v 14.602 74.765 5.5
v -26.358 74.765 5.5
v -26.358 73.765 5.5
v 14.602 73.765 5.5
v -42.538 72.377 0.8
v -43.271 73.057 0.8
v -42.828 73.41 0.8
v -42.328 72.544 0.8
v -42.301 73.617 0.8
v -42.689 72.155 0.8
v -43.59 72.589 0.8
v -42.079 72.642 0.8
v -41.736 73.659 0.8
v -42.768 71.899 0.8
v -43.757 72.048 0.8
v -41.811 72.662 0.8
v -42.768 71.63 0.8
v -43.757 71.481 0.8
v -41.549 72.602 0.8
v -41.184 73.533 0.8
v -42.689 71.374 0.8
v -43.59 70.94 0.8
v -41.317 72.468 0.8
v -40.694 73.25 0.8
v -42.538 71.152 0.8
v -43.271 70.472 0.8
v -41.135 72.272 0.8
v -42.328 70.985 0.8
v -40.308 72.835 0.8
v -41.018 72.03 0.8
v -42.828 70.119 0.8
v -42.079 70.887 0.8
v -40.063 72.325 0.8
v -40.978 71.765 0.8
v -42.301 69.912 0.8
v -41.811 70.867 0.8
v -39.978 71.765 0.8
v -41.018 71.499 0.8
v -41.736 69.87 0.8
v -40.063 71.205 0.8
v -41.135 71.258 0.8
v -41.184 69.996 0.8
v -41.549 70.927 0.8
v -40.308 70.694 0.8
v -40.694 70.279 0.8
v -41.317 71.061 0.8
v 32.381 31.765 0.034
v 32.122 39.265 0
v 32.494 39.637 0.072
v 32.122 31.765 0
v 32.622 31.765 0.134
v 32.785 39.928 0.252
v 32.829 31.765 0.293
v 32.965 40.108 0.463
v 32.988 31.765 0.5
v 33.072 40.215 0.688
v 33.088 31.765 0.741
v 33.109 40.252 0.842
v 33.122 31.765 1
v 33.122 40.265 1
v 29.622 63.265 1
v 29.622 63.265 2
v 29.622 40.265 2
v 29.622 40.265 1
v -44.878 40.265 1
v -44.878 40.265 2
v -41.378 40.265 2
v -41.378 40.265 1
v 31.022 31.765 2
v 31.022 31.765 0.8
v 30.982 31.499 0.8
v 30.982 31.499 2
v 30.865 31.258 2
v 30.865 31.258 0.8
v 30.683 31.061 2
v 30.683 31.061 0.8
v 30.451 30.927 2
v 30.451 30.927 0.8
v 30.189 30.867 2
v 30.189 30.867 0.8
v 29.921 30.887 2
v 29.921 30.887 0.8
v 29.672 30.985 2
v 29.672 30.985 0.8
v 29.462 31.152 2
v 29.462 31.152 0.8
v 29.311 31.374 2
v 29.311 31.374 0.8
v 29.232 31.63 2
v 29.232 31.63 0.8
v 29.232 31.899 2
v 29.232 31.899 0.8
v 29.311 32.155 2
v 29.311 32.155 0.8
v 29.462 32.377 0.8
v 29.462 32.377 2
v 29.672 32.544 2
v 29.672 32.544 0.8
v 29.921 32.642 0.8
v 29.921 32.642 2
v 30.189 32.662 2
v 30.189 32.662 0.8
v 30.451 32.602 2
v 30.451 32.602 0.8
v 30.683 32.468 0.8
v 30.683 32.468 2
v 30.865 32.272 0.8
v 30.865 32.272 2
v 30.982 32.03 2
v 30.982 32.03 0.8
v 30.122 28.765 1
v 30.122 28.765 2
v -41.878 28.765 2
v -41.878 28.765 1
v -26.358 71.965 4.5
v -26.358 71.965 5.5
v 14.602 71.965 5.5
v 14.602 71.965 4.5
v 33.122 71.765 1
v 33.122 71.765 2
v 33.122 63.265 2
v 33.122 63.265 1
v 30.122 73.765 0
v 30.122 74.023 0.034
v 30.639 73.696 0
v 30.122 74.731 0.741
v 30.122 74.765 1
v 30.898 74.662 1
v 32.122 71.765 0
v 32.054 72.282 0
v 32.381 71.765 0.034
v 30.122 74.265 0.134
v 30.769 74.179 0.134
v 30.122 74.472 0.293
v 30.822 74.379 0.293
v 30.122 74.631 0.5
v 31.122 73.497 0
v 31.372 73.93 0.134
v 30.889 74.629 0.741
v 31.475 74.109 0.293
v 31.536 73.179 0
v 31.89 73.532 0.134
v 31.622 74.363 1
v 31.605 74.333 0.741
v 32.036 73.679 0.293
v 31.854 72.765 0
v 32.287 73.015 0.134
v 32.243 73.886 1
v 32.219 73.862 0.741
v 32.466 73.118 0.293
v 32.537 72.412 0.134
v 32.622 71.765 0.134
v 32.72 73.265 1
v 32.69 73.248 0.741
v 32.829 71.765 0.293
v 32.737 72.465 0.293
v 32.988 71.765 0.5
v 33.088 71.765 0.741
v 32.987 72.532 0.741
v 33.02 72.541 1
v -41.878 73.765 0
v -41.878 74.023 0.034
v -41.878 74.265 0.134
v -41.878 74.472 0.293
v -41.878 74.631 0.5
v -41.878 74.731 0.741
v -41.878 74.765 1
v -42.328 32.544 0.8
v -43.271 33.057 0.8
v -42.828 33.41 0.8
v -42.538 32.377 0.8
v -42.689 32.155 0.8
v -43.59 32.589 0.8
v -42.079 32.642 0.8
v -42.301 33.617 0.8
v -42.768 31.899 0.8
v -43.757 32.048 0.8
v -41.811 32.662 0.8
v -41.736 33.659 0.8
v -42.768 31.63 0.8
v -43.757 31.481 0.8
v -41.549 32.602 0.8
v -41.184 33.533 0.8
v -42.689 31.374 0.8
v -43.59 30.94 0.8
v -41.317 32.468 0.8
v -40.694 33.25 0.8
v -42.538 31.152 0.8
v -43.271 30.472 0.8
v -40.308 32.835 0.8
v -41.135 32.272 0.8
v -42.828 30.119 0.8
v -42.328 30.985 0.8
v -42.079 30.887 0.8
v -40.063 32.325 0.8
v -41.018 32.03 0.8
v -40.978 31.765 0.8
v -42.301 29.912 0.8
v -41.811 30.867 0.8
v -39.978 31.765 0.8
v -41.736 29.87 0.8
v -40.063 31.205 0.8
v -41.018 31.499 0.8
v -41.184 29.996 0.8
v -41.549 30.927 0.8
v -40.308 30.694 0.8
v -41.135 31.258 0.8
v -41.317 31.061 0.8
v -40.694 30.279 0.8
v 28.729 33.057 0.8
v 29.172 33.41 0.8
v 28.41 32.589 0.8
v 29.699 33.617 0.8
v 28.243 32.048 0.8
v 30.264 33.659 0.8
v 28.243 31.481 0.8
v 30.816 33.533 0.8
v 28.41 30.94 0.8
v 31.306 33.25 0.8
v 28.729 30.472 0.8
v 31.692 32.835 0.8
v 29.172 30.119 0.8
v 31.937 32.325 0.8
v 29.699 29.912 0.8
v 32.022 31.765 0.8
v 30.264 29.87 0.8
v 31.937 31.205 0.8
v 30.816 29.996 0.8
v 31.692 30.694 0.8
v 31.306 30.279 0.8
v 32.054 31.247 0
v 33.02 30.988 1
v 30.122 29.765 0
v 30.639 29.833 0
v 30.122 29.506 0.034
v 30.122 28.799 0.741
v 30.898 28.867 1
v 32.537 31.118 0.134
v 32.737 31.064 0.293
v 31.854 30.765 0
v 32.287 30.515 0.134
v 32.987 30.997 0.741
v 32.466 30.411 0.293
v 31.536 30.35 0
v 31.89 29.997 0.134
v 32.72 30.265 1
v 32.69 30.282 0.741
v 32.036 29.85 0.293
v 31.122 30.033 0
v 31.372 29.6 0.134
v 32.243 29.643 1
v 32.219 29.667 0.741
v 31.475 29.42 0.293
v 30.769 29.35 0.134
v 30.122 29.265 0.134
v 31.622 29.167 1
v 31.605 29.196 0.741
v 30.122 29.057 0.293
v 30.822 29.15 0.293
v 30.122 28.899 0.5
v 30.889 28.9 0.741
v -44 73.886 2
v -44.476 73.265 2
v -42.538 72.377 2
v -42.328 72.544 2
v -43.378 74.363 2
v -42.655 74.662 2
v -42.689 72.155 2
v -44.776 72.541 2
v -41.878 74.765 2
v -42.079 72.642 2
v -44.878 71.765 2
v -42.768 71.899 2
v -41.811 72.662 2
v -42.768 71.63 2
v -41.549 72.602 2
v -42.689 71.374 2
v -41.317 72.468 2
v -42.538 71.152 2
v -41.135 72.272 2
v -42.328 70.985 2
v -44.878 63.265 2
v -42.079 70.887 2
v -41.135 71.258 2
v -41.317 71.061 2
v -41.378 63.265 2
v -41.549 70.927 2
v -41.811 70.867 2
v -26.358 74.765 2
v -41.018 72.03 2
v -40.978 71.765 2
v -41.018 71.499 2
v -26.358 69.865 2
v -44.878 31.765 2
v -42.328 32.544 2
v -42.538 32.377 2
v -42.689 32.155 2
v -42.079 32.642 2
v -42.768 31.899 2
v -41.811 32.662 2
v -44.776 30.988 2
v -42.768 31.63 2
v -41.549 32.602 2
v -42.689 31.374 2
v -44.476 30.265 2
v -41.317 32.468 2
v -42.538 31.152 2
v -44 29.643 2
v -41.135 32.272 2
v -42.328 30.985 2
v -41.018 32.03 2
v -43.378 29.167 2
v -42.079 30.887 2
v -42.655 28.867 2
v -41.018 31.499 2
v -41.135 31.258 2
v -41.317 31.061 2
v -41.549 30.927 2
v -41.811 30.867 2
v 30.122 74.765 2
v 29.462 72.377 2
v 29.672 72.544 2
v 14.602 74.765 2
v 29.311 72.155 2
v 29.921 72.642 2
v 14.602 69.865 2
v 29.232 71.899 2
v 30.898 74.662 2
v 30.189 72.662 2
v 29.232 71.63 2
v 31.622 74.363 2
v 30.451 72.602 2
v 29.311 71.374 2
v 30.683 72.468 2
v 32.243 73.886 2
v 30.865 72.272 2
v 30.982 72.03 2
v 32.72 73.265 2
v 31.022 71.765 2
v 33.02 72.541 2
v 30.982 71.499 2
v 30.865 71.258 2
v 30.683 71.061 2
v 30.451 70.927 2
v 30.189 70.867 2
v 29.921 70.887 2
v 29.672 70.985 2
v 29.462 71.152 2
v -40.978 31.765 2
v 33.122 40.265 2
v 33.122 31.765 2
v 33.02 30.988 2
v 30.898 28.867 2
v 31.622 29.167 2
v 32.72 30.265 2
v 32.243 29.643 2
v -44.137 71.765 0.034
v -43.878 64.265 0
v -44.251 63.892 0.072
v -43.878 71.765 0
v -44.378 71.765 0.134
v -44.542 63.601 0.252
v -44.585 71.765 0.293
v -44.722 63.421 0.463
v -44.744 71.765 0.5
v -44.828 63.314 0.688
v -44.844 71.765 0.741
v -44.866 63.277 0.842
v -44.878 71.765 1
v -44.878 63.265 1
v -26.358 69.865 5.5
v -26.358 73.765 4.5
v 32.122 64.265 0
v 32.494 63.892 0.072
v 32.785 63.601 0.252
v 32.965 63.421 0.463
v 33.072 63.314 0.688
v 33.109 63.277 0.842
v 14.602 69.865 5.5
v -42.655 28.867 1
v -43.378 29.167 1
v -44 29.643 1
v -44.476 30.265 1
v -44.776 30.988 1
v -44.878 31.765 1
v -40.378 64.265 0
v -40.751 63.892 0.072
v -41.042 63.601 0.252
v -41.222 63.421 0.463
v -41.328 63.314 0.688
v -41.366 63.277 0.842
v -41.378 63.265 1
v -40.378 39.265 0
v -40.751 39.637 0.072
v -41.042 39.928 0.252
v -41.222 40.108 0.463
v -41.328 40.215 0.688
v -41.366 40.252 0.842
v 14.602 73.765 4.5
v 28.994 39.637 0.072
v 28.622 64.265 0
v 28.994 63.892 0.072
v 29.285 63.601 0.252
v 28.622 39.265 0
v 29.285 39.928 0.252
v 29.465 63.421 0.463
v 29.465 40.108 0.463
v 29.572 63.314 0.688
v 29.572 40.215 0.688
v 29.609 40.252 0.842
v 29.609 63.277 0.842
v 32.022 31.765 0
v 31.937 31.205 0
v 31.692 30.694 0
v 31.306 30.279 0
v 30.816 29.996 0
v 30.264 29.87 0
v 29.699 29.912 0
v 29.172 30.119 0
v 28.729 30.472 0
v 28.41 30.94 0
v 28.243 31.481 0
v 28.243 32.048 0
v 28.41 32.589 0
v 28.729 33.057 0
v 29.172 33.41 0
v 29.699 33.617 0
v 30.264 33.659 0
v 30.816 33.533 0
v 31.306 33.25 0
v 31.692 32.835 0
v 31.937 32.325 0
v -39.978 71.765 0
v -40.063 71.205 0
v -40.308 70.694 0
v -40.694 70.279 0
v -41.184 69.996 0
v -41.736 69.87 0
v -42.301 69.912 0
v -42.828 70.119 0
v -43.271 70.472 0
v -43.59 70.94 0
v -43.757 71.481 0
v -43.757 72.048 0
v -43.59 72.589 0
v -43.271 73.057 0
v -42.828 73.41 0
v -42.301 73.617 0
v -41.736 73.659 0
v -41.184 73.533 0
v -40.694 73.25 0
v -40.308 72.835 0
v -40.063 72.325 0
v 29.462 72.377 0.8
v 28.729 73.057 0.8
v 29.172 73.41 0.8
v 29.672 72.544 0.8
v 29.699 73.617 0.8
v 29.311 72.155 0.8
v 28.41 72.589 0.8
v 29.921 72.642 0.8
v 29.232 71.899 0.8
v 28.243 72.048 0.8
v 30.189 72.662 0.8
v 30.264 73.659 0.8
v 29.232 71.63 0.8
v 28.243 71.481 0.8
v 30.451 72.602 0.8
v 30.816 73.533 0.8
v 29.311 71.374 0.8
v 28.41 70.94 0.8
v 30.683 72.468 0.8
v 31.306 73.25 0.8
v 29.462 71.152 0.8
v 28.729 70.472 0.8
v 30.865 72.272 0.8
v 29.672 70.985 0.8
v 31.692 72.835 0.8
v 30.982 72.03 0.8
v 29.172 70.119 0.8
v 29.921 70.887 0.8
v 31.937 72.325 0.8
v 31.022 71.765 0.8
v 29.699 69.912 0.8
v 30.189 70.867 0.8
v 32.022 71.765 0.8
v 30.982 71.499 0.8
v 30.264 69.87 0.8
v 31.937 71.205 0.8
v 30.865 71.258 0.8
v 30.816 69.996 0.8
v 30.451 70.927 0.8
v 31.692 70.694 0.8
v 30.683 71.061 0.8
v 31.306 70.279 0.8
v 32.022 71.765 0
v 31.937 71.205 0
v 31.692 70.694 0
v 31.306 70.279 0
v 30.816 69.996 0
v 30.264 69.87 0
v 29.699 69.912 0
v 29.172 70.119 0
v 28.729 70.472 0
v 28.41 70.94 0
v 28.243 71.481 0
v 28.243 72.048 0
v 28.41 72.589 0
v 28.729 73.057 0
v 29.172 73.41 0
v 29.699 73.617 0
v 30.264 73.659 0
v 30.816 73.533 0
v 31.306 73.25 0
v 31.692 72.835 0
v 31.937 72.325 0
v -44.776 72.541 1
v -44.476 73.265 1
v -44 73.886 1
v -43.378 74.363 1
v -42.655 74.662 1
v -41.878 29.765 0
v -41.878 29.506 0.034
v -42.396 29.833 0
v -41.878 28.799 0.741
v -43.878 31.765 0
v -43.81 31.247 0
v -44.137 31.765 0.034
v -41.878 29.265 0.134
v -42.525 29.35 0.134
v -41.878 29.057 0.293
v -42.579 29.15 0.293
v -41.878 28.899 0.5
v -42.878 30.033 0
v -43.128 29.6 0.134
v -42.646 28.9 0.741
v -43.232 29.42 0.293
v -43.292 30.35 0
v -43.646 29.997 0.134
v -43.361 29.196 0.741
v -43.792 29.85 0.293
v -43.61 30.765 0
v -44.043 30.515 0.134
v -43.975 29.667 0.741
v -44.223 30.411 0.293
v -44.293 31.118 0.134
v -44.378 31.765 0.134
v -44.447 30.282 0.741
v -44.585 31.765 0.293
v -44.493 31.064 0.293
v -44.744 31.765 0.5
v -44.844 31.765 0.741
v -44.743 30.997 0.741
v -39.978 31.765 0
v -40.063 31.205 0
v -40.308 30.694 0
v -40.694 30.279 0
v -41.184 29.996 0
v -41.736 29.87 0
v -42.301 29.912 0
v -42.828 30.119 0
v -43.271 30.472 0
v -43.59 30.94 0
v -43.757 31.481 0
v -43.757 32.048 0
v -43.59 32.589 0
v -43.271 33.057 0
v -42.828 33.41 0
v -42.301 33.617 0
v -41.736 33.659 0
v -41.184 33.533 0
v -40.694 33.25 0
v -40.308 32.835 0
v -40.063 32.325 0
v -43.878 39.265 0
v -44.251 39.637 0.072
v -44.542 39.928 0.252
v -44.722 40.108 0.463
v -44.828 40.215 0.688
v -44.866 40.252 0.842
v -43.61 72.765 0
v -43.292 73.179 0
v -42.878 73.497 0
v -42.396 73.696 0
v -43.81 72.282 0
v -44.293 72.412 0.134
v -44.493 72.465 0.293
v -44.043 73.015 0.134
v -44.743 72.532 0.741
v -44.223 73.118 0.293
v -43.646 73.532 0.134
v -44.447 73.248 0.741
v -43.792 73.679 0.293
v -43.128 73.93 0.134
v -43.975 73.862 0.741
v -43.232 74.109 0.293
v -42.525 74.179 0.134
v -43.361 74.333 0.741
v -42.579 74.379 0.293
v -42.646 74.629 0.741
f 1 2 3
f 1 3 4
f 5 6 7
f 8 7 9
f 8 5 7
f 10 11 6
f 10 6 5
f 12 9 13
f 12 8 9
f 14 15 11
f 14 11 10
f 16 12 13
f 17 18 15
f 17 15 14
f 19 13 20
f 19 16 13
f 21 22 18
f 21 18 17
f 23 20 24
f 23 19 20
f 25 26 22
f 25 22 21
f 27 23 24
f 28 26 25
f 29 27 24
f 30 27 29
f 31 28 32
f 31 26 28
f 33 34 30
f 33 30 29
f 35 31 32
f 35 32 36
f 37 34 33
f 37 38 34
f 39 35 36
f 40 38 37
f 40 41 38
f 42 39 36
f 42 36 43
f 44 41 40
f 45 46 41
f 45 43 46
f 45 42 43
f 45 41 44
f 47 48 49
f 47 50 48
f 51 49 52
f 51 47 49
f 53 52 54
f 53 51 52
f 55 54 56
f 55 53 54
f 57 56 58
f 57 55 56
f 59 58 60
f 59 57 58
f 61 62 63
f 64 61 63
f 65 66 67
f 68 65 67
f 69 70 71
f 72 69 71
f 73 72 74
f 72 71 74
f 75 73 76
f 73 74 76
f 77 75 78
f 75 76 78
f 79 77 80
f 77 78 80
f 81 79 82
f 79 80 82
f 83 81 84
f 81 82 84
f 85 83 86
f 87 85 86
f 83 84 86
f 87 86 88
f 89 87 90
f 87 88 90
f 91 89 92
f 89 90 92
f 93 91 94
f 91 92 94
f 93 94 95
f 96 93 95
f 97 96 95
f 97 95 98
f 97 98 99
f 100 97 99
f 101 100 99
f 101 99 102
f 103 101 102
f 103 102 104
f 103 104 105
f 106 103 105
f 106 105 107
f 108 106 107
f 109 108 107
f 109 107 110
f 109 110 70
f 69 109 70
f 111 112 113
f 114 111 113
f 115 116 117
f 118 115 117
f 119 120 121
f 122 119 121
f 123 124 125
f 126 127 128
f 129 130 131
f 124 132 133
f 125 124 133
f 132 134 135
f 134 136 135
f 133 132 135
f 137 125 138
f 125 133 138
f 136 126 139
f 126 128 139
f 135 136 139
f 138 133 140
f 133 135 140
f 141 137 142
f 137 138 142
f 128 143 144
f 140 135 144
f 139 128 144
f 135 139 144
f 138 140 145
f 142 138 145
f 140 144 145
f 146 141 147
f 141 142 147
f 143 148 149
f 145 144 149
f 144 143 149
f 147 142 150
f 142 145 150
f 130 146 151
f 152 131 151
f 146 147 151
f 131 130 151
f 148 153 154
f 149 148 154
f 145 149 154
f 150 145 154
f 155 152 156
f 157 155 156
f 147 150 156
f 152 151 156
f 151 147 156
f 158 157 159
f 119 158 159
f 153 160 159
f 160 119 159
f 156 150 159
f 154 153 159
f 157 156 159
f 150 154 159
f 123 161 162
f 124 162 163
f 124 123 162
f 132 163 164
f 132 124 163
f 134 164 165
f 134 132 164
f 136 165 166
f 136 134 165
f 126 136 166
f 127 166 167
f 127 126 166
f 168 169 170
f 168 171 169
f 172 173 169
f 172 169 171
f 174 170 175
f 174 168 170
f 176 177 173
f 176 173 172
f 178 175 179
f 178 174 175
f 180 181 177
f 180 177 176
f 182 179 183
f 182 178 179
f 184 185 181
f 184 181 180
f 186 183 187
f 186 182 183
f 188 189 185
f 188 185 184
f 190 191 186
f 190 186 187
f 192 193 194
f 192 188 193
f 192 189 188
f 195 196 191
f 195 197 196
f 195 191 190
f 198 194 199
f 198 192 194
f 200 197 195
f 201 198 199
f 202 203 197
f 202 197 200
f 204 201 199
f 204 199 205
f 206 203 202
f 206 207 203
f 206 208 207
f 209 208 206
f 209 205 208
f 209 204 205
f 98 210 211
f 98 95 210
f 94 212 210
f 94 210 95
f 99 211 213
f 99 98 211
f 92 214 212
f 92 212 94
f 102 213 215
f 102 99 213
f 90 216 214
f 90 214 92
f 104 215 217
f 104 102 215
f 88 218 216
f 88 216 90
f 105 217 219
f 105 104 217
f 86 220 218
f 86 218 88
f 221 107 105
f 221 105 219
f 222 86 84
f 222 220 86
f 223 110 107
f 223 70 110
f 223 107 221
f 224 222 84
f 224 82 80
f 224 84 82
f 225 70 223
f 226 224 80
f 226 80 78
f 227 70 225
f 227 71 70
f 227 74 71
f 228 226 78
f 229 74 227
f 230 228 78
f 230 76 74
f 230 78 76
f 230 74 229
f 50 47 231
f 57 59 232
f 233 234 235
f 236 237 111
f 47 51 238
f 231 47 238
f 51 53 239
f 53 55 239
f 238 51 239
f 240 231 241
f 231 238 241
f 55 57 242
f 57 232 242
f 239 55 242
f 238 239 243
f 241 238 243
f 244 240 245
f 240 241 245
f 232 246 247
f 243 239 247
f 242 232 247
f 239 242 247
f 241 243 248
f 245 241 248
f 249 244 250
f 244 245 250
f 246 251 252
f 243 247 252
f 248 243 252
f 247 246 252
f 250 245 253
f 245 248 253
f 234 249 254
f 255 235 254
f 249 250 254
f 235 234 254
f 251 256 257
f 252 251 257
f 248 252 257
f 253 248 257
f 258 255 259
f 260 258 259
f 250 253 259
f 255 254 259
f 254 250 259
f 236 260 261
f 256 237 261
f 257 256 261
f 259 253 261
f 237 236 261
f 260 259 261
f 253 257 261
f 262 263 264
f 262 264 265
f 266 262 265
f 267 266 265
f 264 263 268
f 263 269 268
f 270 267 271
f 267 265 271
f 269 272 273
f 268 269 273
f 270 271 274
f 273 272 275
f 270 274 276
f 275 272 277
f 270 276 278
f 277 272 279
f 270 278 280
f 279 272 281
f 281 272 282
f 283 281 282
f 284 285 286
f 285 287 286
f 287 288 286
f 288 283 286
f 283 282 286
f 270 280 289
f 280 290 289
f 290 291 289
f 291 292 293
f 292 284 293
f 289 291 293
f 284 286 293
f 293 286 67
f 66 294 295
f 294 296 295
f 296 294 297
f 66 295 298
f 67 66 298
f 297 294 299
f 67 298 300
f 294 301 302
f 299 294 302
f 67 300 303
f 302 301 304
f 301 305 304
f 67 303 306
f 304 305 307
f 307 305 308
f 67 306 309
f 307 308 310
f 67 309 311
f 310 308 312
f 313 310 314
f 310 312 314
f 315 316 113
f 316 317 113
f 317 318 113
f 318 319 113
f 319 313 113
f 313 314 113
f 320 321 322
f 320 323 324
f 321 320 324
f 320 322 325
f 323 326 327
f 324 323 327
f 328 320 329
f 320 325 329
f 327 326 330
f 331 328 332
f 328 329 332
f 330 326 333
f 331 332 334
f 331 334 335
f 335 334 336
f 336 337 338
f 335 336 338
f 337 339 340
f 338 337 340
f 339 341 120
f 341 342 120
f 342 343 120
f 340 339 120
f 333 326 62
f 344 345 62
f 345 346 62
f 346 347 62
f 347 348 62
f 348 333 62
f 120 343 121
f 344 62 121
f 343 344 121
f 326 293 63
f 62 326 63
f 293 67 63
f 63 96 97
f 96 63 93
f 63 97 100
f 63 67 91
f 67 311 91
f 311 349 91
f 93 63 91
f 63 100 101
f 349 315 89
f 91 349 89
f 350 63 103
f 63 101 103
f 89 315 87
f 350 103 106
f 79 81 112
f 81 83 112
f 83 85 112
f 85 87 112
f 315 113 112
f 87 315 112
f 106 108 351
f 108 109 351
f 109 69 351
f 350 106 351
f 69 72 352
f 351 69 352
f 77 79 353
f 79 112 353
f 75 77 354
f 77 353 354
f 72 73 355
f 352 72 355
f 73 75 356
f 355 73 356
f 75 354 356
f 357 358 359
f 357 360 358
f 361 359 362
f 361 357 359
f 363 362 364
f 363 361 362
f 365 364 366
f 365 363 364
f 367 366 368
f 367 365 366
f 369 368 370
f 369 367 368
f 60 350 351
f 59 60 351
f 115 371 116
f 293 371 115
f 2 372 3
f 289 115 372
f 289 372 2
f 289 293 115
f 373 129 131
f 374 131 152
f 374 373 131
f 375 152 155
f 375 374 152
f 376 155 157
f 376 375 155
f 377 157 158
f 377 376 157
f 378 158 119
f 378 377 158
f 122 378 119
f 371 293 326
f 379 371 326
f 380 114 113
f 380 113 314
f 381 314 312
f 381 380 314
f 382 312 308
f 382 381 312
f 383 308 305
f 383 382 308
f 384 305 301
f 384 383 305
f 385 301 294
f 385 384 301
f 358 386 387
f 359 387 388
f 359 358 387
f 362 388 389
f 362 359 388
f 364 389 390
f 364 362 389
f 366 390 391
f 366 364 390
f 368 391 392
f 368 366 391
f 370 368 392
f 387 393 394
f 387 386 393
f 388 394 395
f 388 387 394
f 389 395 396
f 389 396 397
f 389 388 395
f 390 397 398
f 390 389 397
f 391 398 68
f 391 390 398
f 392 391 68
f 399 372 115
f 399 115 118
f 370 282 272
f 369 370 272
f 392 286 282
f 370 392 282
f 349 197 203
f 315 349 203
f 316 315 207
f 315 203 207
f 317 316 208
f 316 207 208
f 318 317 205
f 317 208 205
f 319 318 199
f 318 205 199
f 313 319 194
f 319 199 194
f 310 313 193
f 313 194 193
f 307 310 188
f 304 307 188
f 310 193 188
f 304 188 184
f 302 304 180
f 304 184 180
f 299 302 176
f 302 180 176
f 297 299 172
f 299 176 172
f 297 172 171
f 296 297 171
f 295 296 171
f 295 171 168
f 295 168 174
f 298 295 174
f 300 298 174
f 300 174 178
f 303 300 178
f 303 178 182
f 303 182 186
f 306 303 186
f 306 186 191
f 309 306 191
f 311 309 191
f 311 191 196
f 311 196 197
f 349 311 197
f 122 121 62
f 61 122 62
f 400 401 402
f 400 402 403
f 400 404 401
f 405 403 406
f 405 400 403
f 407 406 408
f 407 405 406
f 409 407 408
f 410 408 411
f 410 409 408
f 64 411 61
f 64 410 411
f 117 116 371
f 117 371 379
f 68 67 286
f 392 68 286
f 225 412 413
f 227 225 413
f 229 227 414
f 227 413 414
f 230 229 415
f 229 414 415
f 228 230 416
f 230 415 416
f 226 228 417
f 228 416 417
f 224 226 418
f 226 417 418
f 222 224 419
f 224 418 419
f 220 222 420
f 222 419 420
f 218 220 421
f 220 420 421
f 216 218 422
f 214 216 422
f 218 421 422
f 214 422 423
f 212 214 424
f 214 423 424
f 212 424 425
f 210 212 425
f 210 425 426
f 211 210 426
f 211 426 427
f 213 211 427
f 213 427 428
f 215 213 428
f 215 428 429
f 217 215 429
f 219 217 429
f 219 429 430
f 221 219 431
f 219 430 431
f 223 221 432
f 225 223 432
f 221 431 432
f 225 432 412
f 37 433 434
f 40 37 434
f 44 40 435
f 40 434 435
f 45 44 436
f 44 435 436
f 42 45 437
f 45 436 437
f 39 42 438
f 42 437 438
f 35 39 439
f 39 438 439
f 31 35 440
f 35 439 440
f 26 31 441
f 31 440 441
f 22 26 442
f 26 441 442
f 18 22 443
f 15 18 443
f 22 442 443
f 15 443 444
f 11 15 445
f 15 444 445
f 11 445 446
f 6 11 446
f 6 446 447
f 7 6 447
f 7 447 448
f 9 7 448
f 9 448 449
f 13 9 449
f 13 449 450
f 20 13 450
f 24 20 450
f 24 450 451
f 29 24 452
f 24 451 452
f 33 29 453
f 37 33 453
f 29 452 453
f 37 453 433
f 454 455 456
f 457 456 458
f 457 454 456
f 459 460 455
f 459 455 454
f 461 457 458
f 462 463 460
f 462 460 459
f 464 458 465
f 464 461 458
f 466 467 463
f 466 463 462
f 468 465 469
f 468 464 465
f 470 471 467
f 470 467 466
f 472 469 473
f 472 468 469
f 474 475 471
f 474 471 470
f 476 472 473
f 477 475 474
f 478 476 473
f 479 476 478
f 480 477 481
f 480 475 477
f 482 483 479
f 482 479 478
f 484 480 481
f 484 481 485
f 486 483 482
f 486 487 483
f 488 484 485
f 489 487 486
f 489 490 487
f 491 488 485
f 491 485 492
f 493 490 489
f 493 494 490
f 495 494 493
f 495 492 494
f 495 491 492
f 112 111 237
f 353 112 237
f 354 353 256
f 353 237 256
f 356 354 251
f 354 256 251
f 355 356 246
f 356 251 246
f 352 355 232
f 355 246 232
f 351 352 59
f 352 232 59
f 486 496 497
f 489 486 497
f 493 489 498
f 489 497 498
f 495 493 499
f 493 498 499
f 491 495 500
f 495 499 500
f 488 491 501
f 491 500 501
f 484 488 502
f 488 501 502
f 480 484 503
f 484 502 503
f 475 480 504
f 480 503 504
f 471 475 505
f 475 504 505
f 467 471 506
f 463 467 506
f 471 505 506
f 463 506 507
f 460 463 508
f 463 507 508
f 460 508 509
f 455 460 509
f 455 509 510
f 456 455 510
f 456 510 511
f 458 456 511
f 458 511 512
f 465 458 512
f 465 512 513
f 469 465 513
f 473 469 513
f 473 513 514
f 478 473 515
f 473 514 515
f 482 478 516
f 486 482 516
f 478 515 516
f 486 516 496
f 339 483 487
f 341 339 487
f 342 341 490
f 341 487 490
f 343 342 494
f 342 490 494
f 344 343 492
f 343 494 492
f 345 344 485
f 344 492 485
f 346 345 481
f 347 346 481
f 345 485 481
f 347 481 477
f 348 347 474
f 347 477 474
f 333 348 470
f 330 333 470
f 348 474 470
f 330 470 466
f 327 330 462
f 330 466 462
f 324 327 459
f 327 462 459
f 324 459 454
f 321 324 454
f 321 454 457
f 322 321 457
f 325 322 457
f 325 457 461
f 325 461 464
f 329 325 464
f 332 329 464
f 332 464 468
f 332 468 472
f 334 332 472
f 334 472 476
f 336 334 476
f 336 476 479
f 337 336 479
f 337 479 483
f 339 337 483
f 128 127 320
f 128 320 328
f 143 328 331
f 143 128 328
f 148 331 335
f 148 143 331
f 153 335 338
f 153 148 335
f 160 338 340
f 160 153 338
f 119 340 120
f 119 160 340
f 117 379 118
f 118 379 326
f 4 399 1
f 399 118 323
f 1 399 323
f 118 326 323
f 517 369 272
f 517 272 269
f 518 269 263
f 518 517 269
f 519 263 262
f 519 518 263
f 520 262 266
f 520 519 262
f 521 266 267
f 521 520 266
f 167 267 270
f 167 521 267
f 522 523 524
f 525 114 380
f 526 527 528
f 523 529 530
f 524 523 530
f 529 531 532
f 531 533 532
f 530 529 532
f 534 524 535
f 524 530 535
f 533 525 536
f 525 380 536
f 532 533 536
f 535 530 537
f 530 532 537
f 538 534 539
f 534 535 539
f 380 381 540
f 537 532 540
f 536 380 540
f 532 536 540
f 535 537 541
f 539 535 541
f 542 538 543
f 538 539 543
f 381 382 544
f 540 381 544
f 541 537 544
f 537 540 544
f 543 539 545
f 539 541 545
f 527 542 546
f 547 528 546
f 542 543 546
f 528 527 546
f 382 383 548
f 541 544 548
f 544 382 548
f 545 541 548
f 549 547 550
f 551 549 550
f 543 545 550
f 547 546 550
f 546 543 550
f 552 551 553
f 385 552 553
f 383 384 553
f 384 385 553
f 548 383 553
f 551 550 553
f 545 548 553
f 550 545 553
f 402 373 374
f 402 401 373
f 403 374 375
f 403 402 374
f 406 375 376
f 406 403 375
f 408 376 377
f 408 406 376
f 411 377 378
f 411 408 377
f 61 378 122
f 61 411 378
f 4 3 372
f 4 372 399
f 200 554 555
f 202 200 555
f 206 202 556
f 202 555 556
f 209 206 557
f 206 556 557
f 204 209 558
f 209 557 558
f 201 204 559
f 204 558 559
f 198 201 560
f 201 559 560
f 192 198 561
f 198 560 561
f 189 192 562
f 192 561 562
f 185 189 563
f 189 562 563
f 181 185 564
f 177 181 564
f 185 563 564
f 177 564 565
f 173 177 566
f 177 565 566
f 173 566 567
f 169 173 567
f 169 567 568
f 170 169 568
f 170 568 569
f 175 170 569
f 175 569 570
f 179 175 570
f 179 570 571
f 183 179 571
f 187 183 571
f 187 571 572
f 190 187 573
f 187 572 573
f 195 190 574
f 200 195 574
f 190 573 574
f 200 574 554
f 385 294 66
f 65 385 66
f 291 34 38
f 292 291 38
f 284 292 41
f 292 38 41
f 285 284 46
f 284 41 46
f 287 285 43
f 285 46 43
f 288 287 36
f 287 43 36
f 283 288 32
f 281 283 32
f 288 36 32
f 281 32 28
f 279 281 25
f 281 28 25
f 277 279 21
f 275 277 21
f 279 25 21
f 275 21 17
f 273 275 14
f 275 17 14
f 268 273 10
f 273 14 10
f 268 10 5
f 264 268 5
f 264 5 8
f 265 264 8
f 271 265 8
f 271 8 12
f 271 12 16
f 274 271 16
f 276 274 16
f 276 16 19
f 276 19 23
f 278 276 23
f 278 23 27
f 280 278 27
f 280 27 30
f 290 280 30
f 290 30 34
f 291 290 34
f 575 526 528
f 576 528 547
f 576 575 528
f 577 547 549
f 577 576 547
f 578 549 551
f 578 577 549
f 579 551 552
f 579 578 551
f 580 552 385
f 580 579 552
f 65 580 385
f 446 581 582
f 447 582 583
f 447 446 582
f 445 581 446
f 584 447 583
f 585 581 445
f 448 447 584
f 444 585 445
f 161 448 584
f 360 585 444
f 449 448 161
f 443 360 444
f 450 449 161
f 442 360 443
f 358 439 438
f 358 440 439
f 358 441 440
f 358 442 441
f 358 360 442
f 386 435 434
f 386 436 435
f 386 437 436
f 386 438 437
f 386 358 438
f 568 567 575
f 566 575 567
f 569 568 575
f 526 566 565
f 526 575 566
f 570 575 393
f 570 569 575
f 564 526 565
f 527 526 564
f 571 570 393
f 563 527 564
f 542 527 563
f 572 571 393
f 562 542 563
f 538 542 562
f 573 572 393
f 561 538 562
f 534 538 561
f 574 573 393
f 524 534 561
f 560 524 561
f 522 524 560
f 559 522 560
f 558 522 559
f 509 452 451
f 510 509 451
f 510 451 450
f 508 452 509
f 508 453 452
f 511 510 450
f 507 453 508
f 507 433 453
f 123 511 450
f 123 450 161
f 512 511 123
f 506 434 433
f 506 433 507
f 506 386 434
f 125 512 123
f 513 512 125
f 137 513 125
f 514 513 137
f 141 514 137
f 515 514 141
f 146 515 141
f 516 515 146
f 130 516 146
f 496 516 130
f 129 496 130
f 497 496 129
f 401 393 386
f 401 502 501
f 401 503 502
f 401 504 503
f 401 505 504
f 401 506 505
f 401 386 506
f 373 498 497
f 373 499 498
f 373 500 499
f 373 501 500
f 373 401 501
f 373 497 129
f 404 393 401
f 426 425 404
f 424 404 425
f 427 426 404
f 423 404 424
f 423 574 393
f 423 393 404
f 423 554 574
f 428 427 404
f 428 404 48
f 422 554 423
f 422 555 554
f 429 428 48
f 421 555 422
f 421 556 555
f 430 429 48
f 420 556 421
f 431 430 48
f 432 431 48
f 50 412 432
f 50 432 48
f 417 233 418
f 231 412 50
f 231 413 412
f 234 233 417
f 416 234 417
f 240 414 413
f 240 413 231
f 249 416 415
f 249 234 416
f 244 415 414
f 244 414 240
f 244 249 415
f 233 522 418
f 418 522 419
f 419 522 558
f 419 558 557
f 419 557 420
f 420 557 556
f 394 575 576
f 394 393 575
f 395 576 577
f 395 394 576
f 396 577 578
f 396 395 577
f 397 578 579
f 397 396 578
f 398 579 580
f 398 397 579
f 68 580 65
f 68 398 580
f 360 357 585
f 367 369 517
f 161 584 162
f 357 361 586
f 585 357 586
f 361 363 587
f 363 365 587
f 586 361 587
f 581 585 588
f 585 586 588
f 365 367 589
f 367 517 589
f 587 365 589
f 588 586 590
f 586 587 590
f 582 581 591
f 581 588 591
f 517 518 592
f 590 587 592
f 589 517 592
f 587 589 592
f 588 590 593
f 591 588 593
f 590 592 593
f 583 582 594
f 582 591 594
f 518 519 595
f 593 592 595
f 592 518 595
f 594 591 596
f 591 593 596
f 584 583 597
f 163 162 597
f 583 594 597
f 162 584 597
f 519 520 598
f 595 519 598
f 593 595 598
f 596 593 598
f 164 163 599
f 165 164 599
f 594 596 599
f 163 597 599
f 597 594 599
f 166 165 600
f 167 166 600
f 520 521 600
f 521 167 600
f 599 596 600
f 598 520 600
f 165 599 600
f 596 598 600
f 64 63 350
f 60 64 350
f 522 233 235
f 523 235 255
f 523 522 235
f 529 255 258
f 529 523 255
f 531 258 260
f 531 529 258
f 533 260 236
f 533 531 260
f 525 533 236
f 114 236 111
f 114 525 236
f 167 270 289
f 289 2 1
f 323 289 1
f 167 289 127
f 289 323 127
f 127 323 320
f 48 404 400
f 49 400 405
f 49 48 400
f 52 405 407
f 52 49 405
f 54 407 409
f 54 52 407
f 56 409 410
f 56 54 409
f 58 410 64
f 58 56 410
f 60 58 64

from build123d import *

# Parameters (mm, degrees)
F1_DEPTH  = 2
F2_R      = 3
F3_R      = 0.9
F4_DEPTH  = 2.5
F5_R      = 1
F6_W      = 40.96
F6_H      = 4.9
F7_DEPTH  = 3.5
F8_W      = 40.96
F8_H      = 1.8
F9_DEPTH  = 1
F10_ANGLE = 180
F12_R     = 1.9
F13_DEPTH = 0.8


with BuildPart() as f1:
    # F0 (on Top) → F1 (new body)
    with BuildSketch(Plane.XY):
        Polygon((33.1217415035, 28.7645919905), (-44.8782584965, 28.7645919905), (-44.8782584965, 17.2645919905), (-41.3782584965, 17.2645919905), (-41.3782584965, -5.7354080095), (-44.8782584965, -5.7354080095), (-44.8782584965, -17.2354080095), (33.1217415035, -17.2354080095), (33.1217415035, -5.7354080095), (29.6217415035, -5.7354080095), (29.6217415035, 17.2645919905), (33.1217415035, 17.2645919905), align=None)
    extrude(amount=F1_DEPTH)

    # F2
    f2_edges = [f1.edges().sort_by_distance(p)[0] for p in [
        (-44.878258, 28.764592, 1),
        (33.121742, 28.764592, 1),
        (33.121742, -17.235408, 1),
        (-44.878258, -17.235408, 1),
    ]]
    fillet(f2_edges, radius=F2_R)

    # F3 (on face) → F4 (cut)
    with BuildSketch(Plane.XY.offset(2)):
        with Locations((-41.8782584965, -14.2354080095)):
            Circle(F3_R)
        with Locations((30.1217415035, -14.2354080095)):
            Circle(F3_R)
        with Locations((30.1217415035, 25.7645919905)):
            Circle(F3_R)
        with Locations((-41.8782584965, 25.7645919905)):
            Circle(F3_R)
    extrude(amount=-F4_DEPTH, mode=Mode.SUBTRACT)

    # F5
    f5_edges = [f1.edges().sort_by_distance(p)[0] for p in [
        (33.121742, -9.985408, 2),
        (32.243062, -16.356728, 2),
        (31.371742, -5.735408, 2),
        (29.621742, 5.764592, 2),
        (31.371742, 17.264592, 2),
        (33.121742, 21.514592, 2),
        (-43.128258, 17.264592, 2),
        (-41.378258, 5.764592, 2),
        (-43.128258, -5.735408, 2),
    ]]
    fillet(f5_edges, radius=F5_R)

    # F6 (on face) → F7 (join)
    with BuildSketch(Plane(origin=(0, 0, 0), x_dir=(1, 0, 0), z_dir=(0, 0, -1))):
        with Locations((-5.8782584965, 14.7854080095)):
            Rectangle(F6_W, F6_H)
    extrude(amount=F7_DEPTH)

    # F8 (on face) → F9 (cut)
    with BuildSketch(Plane(origin=(0, 0, -3.5), x_dir=(1, 0, 0), z_dir=(0, 0, -1))):
        with Locations((-5.8782584965, 15.3354080095)):
            Rectangle(F8_W, F8_H)
    extrude(amount=-F9_DEPTH, mode=Mode.SUBTRACT)


with BuildPart() as f1_1:
    # F10: moved
    add(f1.part.rotate(Axis((-5.8782584965, 28.7645919905, 0), (1, 0, 0)), F10_ANGLE))


with BuildPart() as f1_2:
    # F11: moved
    add(f1_1.part.moved(Location((0, 0, 2))))

    # F12 (on face) → F13 (cut)
    with BuildSketch(Plane(origin=(0, 0, 0), x_dir=(1, 0, 0), z_dir=(0, 0, -1))):
        with Locations((-41.8782584965, -31.7645919905)):
            Circle(F12_R)
        with Locations((-41.8782584965, -71.7645919905)):
            Circle(F12_R)
        with Locations((30.1217415035, -71.7645919905)):
            Circle(F12_R)
        with Locations((30.1217415035, -31.7645919905)):
            Circle(F12_R)
    extrude(amount=-F13_DEPTH, mode=Mode.SUBTRACT)


solid = f1_2.part
